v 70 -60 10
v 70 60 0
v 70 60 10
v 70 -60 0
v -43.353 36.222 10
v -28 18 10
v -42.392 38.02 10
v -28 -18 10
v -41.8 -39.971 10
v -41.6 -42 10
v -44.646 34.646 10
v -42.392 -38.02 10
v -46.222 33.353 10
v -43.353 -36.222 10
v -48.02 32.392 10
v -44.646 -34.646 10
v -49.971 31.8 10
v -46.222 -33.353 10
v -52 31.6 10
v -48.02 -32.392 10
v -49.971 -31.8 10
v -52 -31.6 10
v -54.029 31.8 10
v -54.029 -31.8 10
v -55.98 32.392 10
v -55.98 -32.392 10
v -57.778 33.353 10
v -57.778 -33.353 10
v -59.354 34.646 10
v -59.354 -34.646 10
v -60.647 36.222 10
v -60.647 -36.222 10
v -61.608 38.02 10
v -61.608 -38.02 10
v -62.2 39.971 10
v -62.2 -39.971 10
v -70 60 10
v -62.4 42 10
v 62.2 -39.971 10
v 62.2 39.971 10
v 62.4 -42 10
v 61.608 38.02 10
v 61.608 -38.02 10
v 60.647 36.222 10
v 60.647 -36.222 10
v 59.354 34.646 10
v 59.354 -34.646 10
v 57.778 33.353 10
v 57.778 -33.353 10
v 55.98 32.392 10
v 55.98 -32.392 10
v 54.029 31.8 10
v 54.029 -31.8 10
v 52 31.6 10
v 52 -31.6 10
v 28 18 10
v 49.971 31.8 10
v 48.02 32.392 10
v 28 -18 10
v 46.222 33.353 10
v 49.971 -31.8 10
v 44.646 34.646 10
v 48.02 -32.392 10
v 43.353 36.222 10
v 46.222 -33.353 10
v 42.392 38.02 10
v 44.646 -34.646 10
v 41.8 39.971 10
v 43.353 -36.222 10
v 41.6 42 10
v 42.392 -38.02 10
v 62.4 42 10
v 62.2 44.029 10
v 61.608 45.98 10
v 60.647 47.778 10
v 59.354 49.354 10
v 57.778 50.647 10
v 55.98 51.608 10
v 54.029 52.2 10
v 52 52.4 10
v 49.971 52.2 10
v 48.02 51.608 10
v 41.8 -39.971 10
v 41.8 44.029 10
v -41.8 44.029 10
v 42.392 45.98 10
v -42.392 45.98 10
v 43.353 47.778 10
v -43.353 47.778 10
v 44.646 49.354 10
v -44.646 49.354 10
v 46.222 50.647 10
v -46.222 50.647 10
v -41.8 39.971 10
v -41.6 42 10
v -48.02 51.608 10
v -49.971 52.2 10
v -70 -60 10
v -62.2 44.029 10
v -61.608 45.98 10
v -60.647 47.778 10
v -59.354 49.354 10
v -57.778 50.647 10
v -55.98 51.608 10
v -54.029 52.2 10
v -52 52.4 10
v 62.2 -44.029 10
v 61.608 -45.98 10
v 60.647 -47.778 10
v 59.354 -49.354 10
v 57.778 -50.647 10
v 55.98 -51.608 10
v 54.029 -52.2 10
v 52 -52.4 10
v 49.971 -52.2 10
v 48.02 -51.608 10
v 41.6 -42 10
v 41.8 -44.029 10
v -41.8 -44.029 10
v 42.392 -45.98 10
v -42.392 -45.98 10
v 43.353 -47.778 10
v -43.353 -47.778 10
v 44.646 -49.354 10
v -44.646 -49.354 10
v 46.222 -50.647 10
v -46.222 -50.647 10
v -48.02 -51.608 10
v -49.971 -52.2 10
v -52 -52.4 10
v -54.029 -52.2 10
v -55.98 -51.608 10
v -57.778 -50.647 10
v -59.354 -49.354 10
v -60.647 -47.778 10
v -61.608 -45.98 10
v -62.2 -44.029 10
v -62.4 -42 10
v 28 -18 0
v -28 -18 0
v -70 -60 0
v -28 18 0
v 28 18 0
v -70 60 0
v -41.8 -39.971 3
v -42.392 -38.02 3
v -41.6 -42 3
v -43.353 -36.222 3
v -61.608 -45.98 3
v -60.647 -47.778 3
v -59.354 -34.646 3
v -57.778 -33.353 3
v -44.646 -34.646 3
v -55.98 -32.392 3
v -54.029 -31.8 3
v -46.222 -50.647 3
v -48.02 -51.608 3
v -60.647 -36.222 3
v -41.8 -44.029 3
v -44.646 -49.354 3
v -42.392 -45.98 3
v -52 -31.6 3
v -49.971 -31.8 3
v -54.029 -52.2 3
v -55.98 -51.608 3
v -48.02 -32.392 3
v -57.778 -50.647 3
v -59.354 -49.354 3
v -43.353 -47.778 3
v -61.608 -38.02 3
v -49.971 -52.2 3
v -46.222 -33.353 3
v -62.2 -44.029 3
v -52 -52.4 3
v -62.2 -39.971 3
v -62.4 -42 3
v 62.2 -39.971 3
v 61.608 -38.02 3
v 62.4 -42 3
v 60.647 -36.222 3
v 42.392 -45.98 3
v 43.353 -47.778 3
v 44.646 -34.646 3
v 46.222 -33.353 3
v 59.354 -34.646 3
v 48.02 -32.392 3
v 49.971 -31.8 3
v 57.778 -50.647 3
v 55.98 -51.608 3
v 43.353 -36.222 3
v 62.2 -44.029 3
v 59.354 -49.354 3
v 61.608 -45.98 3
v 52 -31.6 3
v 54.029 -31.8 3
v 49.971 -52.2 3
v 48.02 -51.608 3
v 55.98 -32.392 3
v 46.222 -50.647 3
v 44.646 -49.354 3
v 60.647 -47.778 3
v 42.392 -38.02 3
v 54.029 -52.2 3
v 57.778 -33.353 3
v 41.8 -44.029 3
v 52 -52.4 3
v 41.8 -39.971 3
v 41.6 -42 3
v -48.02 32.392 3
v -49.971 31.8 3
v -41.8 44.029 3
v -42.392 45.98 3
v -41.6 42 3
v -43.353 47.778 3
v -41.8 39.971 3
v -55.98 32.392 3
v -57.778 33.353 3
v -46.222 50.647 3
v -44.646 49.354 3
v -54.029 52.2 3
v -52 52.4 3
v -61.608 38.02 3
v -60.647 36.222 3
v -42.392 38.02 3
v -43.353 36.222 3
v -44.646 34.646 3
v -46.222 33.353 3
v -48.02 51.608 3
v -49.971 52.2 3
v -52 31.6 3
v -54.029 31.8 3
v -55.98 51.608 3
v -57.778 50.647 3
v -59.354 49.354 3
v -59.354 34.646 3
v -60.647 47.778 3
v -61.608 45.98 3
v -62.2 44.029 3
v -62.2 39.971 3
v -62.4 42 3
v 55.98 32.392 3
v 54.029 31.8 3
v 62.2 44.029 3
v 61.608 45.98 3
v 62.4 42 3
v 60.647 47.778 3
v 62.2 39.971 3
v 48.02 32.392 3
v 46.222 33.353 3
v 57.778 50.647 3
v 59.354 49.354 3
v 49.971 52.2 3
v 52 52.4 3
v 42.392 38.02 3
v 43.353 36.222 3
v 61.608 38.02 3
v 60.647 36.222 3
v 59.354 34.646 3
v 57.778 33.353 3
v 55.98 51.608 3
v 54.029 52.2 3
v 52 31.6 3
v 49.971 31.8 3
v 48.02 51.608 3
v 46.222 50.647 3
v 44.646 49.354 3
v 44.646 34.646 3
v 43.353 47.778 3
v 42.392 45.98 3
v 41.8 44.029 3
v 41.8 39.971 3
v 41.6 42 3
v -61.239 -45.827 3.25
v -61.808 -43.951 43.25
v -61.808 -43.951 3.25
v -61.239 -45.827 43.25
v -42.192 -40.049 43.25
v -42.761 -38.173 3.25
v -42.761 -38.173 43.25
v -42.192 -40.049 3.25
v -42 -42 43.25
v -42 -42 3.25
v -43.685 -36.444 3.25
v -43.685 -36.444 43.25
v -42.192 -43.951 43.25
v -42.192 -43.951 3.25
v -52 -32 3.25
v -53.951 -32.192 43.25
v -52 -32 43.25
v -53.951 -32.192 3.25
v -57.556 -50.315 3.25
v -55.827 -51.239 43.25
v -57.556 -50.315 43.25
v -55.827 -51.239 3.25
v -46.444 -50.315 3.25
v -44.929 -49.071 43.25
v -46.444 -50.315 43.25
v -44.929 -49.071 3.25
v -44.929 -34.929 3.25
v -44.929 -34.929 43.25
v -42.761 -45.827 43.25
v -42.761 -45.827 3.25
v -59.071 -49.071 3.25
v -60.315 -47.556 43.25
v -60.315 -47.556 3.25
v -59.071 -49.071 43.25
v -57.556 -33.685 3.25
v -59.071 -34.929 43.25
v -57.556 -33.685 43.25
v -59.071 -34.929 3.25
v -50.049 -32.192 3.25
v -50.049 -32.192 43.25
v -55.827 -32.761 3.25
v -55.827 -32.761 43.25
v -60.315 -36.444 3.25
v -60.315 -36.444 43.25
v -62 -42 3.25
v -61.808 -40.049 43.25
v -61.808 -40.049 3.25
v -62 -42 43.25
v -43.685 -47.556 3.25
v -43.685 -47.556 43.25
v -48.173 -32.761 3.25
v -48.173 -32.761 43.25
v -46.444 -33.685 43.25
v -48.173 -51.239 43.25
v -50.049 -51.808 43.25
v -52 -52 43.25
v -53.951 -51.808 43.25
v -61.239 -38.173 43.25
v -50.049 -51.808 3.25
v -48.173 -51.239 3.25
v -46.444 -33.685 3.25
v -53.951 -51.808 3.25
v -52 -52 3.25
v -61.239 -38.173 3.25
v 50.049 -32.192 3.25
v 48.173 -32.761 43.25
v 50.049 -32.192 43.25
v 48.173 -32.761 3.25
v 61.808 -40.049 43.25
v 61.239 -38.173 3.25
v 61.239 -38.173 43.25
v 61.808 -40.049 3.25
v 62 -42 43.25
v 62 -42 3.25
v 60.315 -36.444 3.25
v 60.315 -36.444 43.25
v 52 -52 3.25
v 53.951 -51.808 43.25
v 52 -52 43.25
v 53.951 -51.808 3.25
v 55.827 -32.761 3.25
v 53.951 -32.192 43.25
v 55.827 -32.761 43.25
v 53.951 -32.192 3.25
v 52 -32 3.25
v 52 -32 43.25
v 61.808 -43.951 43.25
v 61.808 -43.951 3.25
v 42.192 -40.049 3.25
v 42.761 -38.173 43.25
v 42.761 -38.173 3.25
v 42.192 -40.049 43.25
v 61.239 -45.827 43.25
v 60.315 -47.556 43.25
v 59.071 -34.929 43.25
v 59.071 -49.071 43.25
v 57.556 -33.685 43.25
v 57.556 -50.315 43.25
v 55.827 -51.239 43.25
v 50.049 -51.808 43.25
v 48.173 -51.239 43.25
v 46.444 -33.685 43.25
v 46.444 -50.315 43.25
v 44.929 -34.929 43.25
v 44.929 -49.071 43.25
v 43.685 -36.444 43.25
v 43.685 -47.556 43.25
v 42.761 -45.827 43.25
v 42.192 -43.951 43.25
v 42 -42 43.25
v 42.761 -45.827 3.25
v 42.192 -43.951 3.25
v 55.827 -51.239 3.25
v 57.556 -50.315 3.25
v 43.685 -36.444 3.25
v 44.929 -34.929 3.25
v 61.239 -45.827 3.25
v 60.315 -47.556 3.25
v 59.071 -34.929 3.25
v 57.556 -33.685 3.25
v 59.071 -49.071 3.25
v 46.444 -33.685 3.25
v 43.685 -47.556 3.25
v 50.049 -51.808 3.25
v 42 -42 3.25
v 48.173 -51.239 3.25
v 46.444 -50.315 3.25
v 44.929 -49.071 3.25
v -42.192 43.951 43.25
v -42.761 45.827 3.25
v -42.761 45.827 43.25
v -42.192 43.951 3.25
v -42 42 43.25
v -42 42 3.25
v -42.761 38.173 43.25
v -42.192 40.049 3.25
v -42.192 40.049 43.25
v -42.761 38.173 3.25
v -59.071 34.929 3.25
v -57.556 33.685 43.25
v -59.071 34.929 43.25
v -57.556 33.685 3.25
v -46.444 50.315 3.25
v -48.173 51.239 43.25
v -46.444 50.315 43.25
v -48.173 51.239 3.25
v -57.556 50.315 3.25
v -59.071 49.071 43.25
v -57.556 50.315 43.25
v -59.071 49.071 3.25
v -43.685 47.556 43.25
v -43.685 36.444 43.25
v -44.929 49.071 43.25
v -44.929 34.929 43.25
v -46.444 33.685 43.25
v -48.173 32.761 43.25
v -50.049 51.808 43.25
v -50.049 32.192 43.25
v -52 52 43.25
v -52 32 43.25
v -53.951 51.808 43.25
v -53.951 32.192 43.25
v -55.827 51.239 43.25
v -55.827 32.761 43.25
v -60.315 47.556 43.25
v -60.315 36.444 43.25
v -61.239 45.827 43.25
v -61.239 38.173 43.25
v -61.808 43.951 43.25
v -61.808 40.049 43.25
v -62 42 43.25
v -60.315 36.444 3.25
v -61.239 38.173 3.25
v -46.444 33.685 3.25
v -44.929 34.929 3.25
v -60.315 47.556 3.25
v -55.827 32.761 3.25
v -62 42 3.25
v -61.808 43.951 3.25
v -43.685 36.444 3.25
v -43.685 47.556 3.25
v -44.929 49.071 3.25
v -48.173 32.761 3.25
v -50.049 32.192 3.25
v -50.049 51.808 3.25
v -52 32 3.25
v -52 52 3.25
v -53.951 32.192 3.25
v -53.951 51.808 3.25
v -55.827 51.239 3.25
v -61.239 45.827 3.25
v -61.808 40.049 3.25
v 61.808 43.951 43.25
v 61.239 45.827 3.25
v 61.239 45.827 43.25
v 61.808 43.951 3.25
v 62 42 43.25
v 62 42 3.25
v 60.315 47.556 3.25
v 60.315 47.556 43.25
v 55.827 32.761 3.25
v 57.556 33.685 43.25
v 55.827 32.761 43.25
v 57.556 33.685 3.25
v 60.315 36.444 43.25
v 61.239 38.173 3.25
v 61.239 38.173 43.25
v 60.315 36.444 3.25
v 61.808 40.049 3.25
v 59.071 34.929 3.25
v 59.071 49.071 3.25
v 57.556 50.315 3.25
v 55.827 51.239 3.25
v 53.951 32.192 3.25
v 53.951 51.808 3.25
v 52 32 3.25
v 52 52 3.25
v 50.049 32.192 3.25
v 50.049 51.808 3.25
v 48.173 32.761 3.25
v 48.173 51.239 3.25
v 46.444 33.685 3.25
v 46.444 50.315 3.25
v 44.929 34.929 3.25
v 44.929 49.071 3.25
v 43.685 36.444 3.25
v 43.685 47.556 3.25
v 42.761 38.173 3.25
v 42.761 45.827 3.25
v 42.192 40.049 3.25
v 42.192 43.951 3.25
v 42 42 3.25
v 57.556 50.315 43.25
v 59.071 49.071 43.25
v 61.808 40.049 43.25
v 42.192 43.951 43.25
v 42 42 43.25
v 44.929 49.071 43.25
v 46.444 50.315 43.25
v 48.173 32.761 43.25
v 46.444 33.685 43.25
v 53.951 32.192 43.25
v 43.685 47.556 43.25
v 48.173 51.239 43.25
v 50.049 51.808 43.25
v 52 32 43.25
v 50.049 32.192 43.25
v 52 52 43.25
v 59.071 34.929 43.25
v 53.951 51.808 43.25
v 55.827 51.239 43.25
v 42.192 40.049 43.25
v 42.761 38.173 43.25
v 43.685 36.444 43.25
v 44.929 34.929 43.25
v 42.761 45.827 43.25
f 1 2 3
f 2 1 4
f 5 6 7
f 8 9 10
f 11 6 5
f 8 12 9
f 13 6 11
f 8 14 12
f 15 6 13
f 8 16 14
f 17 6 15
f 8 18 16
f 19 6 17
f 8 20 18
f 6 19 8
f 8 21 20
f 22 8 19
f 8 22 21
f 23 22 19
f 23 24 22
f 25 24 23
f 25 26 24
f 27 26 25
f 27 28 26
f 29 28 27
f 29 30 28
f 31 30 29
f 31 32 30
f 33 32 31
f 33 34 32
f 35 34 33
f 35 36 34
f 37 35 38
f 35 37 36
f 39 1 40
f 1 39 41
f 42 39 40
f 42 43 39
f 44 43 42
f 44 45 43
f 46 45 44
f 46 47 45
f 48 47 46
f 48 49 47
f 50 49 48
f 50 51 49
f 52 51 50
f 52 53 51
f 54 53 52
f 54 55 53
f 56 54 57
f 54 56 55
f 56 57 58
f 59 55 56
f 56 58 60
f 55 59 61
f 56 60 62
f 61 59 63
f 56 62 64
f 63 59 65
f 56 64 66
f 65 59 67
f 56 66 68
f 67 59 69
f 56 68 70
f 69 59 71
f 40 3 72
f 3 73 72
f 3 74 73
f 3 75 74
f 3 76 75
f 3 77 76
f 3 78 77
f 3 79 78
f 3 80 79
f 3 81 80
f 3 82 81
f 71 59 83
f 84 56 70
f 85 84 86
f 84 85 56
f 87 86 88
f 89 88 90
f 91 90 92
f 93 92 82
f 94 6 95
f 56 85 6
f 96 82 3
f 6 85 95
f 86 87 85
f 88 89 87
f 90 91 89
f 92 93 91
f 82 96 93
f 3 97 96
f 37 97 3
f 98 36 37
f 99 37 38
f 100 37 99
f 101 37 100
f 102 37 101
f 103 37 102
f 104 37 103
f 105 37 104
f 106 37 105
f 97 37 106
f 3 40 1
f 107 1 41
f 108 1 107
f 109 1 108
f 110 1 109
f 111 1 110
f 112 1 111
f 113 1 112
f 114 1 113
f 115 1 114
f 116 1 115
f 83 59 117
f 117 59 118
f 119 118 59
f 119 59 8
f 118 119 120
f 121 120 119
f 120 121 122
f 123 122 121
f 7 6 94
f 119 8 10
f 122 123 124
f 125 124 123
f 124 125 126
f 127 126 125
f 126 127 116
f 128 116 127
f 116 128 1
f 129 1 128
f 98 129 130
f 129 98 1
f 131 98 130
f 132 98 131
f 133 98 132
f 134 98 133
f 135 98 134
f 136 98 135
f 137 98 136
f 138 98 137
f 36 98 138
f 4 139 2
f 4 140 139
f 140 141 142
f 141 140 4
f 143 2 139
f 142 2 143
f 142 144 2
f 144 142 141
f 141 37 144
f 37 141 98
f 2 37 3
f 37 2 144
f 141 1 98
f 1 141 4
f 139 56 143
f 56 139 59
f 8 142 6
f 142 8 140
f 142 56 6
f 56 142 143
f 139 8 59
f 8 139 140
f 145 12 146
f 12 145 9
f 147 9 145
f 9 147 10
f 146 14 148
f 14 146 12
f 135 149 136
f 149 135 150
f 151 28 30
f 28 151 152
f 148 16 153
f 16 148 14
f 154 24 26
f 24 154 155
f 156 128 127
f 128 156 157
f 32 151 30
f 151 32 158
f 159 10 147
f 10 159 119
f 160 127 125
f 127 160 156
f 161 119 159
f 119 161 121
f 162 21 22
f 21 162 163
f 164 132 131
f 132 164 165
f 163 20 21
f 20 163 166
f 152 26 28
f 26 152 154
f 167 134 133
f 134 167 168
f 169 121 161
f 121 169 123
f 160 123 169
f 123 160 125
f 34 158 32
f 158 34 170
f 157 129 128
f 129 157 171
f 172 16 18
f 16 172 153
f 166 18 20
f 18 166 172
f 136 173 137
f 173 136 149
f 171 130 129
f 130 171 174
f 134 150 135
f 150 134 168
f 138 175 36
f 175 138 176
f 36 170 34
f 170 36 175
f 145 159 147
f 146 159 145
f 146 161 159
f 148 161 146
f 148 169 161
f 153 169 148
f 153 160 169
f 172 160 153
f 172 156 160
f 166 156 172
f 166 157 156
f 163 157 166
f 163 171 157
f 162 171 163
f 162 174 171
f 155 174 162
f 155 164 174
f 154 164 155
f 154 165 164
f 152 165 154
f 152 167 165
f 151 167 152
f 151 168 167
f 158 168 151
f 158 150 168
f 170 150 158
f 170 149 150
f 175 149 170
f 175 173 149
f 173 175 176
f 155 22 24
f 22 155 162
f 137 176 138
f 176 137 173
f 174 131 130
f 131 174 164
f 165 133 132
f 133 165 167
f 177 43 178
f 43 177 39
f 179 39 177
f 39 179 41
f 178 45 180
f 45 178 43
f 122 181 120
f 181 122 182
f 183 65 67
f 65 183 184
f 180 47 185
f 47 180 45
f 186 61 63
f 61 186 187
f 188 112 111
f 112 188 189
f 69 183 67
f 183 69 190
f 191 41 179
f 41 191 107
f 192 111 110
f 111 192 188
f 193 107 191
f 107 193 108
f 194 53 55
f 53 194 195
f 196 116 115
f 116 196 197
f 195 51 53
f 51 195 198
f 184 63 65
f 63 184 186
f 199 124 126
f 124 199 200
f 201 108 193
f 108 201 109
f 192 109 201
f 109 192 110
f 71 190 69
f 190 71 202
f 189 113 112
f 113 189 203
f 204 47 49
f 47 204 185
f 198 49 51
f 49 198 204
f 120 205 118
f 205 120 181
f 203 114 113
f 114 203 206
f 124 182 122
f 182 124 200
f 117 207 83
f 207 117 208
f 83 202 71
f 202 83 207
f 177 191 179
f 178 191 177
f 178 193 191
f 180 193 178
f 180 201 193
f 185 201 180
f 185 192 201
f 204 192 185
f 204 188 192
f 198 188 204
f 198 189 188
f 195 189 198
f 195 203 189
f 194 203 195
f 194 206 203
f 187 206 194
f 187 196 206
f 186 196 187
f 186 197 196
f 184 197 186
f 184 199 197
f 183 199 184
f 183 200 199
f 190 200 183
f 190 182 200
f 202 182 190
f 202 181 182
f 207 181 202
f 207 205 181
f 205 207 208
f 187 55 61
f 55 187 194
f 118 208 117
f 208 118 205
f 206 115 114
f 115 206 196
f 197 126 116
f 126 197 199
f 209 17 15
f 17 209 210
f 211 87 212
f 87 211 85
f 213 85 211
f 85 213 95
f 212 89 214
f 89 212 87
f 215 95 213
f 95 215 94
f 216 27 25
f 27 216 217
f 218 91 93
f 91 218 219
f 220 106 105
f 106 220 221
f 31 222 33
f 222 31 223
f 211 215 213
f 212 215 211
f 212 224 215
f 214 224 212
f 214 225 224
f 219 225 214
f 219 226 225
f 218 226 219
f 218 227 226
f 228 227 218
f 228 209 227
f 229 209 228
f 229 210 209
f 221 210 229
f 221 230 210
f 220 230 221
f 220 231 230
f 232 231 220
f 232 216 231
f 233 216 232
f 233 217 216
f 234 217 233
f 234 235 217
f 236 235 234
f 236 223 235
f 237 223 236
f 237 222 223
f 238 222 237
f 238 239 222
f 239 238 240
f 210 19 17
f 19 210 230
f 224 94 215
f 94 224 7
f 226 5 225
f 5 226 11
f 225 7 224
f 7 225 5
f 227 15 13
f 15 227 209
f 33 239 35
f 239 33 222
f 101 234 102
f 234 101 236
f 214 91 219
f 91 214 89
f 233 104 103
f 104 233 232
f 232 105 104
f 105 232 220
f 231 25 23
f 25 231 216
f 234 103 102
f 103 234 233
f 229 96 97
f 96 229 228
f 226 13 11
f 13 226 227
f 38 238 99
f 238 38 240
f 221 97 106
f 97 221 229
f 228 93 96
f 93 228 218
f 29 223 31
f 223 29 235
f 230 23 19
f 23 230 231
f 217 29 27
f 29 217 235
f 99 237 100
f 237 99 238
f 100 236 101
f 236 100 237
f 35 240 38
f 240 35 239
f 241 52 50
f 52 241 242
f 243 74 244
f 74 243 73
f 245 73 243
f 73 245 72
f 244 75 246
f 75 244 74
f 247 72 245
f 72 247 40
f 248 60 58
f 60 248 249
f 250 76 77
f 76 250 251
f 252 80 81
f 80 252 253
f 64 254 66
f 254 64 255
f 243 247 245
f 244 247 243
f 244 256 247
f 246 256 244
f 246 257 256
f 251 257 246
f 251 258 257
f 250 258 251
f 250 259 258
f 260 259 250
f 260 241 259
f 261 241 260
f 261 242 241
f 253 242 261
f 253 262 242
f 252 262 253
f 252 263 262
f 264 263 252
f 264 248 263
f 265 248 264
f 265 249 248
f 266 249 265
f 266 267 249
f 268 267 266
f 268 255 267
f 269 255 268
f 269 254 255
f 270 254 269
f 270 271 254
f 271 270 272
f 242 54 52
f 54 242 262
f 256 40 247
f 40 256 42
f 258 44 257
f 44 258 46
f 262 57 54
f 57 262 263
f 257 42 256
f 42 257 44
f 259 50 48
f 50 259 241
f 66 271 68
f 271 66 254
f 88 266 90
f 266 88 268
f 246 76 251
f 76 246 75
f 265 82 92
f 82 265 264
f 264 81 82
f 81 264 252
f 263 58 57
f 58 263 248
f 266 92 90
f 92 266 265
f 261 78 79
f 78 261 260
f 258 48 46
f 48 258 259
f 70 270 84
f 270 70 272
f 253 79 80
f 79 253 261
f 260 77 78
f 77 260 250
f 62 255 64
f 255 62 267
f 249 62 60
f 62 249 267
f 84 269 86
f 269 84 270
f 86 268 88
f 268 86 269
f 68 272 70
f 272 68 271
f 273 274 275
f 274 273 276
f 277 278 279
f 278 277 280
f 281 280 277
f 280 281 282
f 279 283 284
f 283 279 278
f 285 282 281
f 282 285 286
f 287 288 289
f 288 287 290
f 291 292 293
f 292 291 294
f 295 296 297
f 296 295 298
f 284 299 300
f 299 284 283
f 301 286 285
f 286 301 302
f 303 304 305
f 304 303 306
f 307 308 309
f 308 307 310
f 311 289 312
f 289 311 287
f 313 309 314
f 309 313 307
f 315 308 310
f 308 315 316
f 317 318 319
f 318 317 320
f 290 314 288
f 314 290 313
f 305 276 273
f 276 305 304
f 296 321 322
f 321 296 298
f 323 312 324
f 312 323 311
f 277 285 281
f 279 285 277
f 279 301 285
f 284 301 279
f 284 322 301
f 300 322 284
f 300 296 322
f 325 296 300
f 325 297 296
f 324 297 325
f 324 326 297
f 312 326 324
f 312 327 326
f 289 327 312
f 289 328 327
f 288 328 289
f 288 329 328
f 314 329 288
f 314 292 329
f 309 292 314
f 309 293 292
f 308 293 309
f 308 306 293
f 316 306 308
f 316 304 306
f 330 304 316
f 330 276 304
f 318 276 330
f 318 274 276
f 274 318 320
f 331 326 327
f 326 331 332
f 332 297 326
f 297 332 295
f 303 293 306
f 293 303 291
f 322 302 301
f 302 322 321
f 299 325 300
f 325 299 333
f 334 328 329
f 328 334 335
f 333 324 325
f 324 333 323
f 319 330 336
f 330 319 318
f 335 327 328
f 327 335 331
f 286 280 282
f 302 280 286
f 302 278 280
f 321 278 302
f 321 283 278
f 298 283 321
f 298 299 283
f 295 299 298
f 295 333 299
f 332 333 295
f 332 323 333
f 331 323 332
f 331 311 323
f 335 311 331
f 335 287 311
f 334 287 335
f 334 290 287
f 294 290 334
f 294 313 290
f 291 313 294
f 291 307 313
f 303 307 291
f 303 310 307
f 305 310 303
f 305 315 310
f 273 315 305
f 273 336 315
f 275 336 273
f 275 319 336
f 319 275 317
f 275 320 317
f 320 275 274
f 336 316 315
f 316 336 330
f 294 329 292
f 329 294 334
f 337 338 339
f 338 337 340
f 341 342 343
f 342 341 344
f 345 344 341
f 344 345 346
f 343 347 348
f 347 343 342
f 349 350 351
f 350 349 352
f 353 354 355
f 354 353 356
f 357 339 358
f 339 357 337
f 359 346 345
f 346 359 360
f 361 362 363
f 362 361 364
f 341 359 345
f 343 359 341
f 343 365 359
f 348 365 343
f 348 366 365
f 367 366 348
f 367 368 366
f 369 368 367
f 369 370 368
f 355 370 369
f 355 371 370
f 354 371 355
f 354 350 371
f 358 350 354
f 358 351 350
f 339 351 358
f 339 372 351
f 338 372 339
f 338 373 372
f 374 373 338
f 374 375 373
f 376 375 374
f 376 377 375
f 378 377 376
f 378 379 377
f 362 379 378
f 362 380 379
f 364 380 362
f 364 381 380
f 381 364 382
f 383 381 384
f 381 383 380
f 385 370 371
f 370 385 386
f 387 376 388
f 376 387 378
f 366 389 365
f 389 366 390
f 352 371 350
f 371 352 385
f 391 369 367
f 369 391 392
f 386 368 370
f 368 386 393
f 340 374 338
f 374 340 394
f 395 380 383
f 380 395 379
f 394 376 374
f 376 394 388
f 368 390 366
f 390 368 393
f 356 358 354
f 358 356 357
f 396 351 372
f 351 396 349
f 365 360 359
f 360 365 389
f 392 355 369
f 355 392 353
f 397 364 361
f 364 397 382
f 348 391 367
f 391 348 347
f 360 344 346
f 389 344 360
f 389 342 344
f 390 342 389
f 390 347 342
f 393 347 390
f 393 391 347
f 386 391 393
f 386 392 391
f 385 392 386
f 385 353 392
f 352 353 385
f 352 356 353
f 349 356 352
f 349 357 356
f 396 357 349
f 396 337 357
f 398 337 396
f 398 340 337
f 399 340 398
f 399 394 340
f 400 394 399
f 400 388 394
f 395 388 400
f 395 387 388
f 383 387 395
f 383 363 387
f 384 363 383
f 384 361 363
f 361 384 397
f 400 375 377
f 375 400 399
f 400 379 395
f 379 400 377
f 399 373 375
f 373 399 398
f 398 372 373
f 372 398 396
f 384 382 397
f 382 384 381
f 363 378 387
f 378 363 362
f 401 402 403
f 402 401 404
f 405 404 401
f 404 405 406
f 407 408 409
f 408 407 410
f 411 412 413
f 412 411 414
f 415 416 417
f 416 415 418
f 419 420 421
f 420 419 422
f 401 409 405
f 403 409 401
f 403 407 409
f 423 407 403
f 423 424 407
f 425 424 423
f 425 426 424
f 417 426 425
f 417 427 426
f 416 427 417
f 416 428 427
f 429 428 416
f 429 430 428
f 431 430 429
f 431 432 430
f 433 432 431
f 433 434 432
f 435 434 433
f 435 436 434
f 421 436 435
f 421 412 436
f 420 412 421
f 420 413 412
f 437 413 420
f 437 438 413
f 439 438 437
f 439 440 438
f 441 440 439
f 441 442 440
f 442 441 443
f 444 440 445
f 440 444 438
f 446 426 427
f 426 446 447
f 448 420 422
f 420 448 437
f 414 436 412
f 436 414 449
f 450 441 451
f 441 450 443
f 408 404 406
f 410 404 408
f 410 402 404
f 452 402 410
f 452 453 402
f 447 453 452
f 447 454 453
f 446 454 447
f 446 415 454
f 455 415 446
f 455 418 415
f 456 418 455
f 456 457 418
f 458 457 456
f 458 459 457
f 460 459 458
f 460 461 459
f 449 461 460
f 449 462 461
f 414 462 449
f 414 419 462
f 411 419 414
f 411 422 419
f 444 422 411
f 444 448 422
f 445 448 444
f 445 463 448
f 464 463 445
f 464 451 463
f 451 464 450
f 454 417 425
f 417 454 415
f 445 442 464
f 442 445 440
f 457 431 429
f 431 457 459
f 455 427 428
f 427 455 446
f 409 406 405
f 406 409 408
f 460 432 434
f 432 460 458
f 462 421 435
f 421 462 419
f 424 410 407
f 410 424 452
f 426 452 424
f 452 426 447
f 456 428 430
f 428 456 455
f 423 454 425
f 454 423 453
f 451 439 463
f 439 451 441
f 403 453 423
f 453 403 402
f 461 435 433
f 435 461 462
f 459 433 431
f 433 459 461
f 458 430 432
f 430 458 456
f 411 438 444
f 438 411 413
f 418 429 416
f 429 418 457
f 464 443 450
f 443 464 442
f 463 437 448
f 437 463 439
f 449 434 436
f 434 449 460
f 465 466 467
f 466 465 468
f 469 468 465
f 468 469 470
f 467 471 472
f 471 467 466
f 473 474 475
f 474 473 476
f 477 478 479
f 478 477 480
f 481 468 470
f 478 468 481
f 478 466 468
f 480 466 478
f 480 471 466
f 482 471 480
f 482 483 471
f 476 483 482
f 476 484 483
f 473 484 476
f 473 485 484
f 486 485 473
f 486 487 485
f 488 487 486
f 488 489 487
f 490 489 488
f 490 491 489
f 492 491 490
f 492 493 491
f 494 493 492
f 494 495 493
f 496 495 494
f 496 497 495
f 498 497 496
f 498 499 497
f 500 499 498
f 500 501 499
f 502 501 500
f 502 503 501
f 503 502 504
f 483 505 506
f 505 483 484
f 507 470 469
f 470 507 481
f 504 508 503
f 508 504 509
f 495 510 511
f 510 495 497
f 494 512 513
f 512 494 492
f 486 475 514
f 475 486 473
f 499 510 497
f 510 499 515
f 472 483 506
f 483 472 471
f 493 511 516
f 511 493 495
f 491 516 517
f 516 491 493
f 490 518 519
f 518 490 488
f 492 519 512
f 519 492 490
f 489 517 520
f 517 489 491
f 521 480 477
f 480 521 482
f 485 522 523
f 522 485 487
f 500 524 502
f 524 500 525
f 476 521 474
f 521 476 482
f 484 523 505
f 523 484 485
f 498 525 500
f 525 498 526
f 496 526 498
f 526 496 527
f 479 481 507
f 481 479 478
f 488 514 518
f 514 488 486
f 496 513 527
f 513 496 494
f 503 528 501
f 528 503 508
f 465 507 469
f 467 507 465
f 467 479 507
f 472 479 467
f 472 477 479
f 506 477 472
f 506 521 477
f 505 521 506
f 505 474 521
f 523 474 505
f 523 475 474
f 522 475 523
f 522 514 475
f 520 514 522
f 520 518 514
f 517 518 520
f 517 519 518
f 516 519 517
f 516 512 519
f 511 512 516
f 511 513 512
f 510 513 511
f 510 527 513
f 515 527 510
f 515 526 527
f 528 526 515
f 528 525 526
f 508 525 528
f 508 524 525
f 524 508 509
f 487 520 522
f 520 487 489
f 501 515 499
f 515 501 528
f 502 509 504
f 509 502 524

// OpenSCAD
$fn = 32;

// ------------------------------------------------------------------------
// Frame with four posts: 140 x 120 mm frame, four d20 posts
// Every part is its own module, assembly() places them once.
// ------------------------------------------------------------------------

// --- part 1 ---
module base_frame() {
  difference() {
    translate([-70, -60, 0]) cube([140, 120, 10]);
    translate([-28, -18, -1]) cube([56, 36, 12]);
    translate([-52, -42, 3]) cylinder(h = 8, d = 20.8);
    translate([52, -42, 3]) cylinder(h = 8, d = 20.8);
    translate([-52, 42, 3]) cylinder(h = 8, d = 20.8);
    translate([52, 42, 3]) cylinder(h = 8, d = 20.8);
  }
}

// --- part 2 ---
module post1() {
  cylinder(h = 40, d = 20);
}

// --- part 3 ---
module post2() {
  cylinder(h = 40, d = 20);
}

// --- part 4 ---
module post3() {
  cylinder(h = 40, d = 20);
}

// --- part 5 ---
module post4() {
  cylinder(h = 40, d = 20);
}

// --- assembly ---
module assembly() {
  translate([0, 0, 0]) rotate([0, 0, 0]) base_frame();
  translate([-52, -42, 3.25]) rotate([0, 0, 0]) post1();
  translate([52, -42, 3.25]) rotate([0, 0, 0]) post2();
  translate([-52, 42, 3.25]) rotate([0, 0, 0]) post3();
  translate([52, 42, 3.25]) rotate([0, 0, 0]) post4();
}

assembly();
